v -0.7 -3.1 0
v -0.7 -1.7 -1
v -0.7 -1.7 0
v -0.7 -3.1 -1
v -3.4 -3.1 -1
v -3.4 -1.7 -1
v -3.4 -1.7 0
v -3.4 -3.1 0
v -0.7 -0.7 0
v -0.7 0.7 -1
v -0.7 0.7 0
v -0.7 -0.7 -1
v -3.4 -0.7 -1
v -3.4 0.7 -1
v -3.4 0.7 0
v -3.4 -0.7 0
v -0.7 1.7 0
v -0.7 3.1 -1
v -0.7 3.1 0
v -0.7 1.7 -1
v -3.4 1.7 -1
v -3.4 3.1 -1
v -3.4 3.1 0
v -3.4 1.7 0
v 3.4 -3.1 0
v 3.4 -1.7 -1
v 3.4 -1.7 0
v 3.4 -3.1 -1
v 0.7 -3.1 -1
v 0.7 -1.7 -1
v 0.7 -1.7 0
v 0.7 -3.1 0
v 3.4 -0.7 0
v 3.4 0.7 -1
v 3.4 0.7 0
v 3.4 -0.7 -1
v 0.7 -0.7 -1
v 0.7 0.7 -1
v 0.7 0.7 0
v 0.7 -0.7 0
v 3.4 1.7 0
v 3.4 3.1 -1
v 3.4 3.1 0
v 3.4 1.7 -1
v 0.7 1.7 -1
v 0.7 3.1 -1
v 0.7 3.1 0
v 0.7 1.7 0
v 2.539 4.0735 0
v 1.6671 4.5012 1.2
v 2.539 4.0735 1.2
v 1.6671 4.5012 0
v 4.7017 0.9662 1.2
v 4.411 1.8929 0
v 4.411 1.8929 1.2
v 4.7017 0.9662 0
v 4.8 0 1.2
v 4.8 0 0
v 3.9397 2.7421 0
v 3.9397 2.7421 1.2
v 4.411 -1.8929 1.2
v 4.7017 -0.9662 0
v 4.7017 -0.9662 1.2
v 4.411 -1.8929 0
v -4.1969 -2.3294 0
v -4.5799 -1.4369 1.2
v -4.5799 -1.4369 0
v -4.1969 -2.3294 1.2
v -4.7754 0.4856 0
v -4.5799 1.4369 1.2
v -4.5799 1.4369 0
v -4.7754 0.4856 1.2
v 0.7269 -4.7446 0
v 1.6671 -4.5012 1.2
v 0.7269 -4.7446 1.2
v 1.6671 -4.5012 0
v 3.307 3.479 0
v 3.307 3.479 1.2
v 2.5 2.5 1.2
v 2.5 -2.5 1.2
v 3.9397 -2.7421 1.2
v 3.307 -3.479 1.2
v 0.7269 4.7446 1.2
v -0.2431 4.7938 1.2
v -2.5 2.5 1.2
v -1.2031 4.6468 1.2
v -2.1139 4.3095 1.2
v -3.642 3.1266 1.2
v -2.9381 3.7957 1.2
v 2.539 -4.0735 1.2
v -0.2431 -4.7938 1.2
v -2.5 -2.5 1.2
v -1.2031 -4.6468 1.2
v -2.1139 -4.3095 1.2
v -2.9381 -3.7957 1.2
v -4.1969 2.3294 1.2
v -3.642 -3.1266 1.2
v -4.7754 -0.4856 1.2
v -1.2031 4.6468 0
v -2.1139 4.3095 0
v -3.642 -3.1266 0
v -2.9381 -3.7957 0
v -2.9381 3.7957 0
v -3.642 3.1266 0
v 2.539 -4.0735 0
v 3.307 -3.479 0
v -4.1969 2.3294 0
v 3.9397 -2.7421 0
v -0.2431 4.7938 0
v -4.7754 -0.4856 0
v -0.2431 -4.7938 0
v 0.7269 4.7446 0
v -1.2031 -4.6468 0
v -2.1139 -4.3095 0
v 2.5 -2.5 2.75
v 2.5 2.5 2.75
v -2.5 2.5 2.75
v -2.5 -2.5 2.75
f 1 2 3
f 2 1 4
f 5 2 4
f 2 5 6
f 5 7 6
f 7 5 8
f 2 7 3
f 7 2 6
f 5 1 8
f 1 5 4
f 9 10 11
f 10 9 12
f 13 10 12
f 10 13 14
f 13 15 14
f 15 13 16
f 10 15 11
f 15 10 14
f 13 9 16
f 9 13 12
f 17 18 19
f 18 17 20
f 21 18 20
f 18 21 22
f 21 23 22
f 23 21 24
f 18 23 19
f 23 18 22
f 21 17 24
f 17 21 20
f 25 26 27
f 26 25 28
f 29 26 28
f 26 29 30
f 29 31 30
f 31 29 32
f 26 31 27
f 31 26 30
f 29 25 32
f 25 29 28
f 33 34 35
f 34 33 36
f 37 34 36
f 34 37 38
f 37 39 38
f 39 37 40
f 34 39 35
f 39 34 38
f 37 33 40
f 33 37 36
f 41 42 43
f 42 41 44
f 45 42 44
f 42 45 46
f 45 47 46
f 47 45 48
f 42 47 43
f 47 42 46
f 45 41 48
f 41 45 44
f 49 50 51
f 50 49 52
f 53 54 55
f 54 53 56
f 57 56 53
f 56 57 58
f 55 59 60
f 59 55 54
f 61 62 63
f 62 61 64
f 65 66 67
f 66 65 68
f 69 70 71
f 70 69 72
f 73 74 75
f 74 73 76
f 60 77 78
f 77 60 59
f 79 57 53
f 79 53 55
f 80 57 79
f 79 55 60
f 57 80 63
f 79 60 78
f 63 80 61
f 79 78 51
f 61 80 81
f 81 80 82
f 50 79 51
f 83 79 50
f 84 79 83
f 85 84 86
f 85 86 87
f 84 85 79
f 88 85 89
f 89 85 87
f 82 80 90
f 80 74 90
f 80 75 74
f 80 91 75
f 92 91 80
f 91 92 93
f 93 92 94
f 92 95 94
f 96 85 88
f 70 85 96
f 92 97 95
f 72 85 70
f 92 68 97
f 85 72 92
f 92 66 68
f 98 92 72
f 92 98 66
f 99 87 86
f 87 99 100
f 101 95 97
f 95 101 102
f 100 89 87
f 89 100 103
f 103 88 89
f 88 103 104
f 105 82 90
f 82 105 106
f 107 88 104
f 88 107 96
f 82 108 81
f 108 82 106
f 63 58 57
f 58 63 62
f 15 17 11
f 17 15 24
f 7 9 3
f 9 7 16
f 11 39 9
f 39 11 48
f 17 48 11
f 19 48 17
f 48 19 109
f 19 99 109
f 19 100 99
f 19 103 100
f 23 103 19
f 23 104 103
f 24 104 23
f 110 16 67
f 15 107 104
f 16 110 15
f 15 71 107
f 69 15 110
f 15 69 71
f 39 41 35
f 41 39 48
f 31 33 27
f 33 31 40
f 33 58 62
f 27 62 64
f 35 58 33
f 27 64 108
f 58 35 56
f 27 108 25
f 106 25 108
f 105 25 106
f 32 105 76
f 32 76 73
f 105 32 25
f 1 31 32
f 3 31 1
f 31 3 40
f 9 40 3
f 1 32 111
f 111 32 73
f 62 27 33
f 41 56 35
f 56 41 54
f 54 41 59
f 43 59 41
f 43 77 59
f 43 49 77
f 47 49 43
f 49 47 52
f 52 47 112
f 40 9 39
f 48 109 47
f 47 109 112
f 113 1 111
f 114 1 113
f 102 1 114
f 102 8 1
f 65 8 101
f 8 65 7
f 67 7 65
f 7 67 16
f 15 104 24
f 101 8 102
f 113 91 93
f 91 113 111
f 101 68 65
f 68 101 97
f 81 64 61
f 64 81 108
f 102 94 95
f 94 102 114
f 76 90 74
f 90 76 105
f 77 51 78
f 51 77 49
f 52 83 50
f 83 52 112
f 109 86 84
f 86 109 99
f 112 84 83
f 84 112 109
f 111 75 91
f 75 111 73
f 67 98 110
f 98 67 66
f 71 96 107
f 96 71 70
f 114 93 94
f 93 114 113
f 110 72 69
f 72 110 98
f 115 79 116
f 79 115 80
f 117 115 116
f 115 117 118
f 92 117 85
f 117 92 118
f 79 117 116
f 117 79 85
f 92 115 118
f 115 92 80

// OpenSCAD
// file: ../lib/2d_shapes.scad
// 2d_shapes.scad -- contains auxiliary functions needed to work with 2D objects */
// Copyright (C) 2023  Maxim Kukushkin <maxim.kukushkin@gmail.com>

/*
This file is part of YetAnotherBurner.

YetAnotherBurner is free software: you can redistribute it and/or modify it under the terms of the GNU General Public License as published by the Free Software Foundation, either version 3 of the License, or (at your option) any later version.

YetAnotherBurner is distributed in the hope that it will be useful, but WITHOUT ANY WARRANTY; without even the implied warranty of MERCHANTABILITY or FITNESS FOR A PARTICULAR PURPOSE. See the GNU General Public License for more details.

You should have received a copy of the GNU General Public License along with YetAnotherBurner. If not, see <https://www.gnu.org/licenses/>. 
*/

use <bezier.scad>

eps = 0.004;

function circv(r = 1, fn = 32, from = 0, to = 360) =
    let(loop_limit = (to - from == 360) ? fn - 1 : fn)
    [ for(i = [0 : loop_limit])
        let(angle = from + (to - from) * i / fn)
            [r * cos(angle), r * sin(angle)] ];

function squarev(coords, rotation = 0) =
    let(
        dist = sqrt(pow(coords.x / 2, 2) + pow(coords.y / 2, 2)),
        angle = asin(coords.y / 2 / dist))
    [
        [dist * cos(angle + rotation), dist * sin(angle + rotation)],
        [dist * cos(180 - angle + rotation), dist * sin(180 - angle + rotation)],
        [dist * cos(180 + angle + rotation), dist * sin(180 + angle + rotation)],
        [dist * cos(-angle + rotation), dist * sin(-angle + rotation)],
    ];

// supports negative sizes
module uncentered_rounded_square(coords, rounding, centerX = false, centerY = false) {
    absX = abs(coords[0]);
    absY = abs(coords[1]); 
    assert(absX > 2 * rounding, "X size doesn't exceed the rounding");
    assert(absY > 2 * rounding, "Y size doesn't exceed the rounding");
    translate([
        centerX ? 0 : (coords.x > 0 ? absX/2 : -absX/2),
        centerY ? 0 : (coords.y > 0 ? absY/2 : -absY/2)
    ]) {        
        square([absX - 2 * rounding, absY], center=true);
        square([absX, absY - 2 * rounding], center=true);
        for (i = [-1, 1], j = [-1, 1])
            translate([i * (absX / 2 - rounding), j * (absY / 2 - rounding)])
                circle(r = rounding);
    }       
}               
                
// supports negative sizes
module centered_rounded_square(coords, rounding, centerX = true, centerY = true) {
    uncentered_rounded_square(coords, rounding, centerX, centerY);
}

// supports negative sizes
module centered_square(coords, centerX = true, centerY = true) {
    translate([
        centerX ? (-abs(coords.x) / 2) : (coords.x > 0 ? 0 : coords.x),
        centerY ? (-abs(coords.y) / 2) : (coords.y > 0 ? 0 : coords.y)
    ])
        square([abs(coords.x), abs(coords.y)]);
}

// supports negative sizes
module uncentered_square(coords, centerX = false, centerY = false) {
    centered_square(coords, centerX, centerY);
}

module smooth_right_angle_2d(x_width, y_width, dot_number = 20, eps = eps) {
    dots = [
        [-eps, -eps],
        for(i = [0 : dot_number])
            PointAlongBez4(
                [x_width , -eps],
                [x_width / 2, -eps],
                [-eps, y_width / 2],
                [-eps, y_width ],
                i / dot_number)
    ];

    polygon(dots);
}

module angle_rounding_2d(r, angle = 90, eps = eps, fromX = true) {
    if (angle == 90)
        difference() {
            translate([-eps, -eps])
                square([r + eps, r + eps]);
            translate([r, r])
                circle(r + eps);
        }
    else {
        dots = [
            [-eps, -eps],
            [r, -eps],
            [-eps + (r + eps) * cos(angle), -eps + (r + eps) * sin(angle)]
        ];
        rotate([0, 0, fromX ? 0 : -angle + 90])
        difference() {
            polygon(dots);
            rotate([0, 0, angle / 2])
                translate([(r + eps) / cos(angle / 2), 0, 0])
                    circle((r + eps) * tan(angle / 2), $fn=100);
        }
    }
}

// this module provides a cutting shape to make a circular cut given the length and
// depth of the cut
module circular_cut(l, depth, eps = eps) {
    if (depth < l / 2) {
        b = l / 2; // 'b' is half of the chord
        // alpha is the angle between radius and the chord going between the top point and one of
        // the points of the original chord
        alpha = atan(b / depth);
        // beta ios the angle between radiuses going to the above chord
        beta = 180 - 2 * alpha;
        c = b / tan(beta); // 'c' is the distance between the original chord and the center of the circle

        intersection() {
            translate([0, -eps])
                centered_square([l, depth + eps], centerY = false);
            translate([0, -c])
                circle(r = c + depth);
        }
    } else {
        translate([0, -eps])
            centered_square([l , depth - l / 2 + eps], centerY = false);
        translate([0, depth - l / 2])
            intersection() {
                circle(d = l);
                translate([0, -eps])
                    centered_square([l, l / 2 + eps], centerY = false);
            }
    }
}
// file: ../lib/3d_shapes.scad
// 3d_shapes.scad -- contains auxiliary functions needed to work with 3D objects */
// Copyright (C) 2023  Maxim Kukushkin <maxim.kukushkin@gmail.com>

/*
This file is part of YetAnotherBurner.

YetAnotherBurner is free software: you can redistribute it and/or modify it under the terms of the GNU General Public License as published by the Free Software Foundation, either version 3 of the License, or (at your option) any later version.

YetAnotherBurner is distributed in the hope that it will be useful, but WITHOUT ANY WARRANTY; without even the implied warranty of MERCHANTABILITY or FITNESS FOR A PARTICULAR PURPOSE. See the GNU General Public License for more details.

You should have received a copy of the GNU General Public License along with YetAnotherBurner. If not, see <https://www.gnu.org/licenses/>. 
*/

use <MCAD/boxes.scad>

use <2d_shapes.scad>

eps = 0.004;

// supports negative sizes
module uncentered_rounded_box(coords, rounding, centerX = false, centerY = false, centerZ = false, sidesonly = true) {
    translate([
        centerX ? 0 : (coords[0] / 2),
        centerY ? 0 : (coords[1] / 2),
        centerZ ? 0 : (coords[2] / 2)
    ])
        roundedBox([abs(coords.x), abs(coords.y), abs(coords.z)], rounding, sidesonly = sidesonly);
}

// supports negative sizes
module centered_rounded_box(coords, rounding, centerX = true, centerY = true, centerZ = true, sidesonly = true) {
    uncentered_rounded_box(coords, rounding, centerX, centerY, centerZ, sidesonly);
}

// supports negative sizes
module uncentered_box(coords, centerX = false, centerY = false, centerZ = false) {
    translate([
        centerX ? (-abs(coords.x) / 2) : (coords.x > 0 ? 0 : coords.x),
        centerY ? (-abs(coords.y) / 2) : (coords.y > 0 ? 0 : coords.y),
        centerZ ? (-abs(coords.z) / 2) : (coords.z > 0 ? 0 : coords.z)
    ])
        cube([abs(coords.x), abs(coords.y), abs(coords.z)]);
}

// supports negative sizes
module centered_box(coords, centerX = true, centerY = true, centerZ = true) {
    uncentered_box(coords, centerX, centerY, centerZ);
}

module angle_rounding(r, h, angle = 90, center = false, eps = eps, fromX = true) {
    linear_extrude(height = h, center = center)
        angle_rounding_2d(r, angle, eps, fromX);
}

module disc(outer_d = -1, h, center = true, outer_r = -1) {
    assert(outer_d != -1 || outer_r != -1, "Either d or r must be specified");
    assert(outer_d == -1 || outer_r == -1, "Both d and r cannot be specified together");

    d = outer_d == -1 ? outer_r * 2 : outer_d;
    cylinder(d = d - h, h = h, center = center);

    translate([0, 0, center ? 0 : h / 2])
        rotate_extrude()
            translate([d / 2 - h / 2, 0])
                circle(d = h, $fn = h * 4);
}
// main file
// ws2812b.scad -- contains a simplified model and sizes of ws2812b RGB LED */
// Copyright (C) 2023  Maxim Kukushkin <maxim.kukushkin@gmail.com>

/*
This file is part of YetAnotherBurner.

YetAnotherBurner is free software: you can redistribute it and/or modify it under the terms of the GNU General Public License as published by the Free Software Foundation, either version 3 of the License, or (at your option) any later version.

YetAnotherBurner is distributed in the hope that it will be useful, but WITHOUT ANY WARRANTY; without even the implied warranty of MERCHANTABILITY or FITNESS FOR A PARTICULAR PURPOSE. See the GNU General Public License for more details.

You should have received a copy of the GNU General Public License along with YetAnotherBurner. If not, see <https://www.gnu.org/licenses/>. 
*/

$fs = 1;
$fa = 0.4;

eps = 0.004;

use <../lib/3d_shapes.scad>

function ws2812b_pcb_d() = 9.6;
function ws2812b_pcb_h() = 1.2;
function ws2812b_pcb_flat_w() = 0.8;
function ws2812b_led_side() = 5;
function ws2812b_led_h() = 1.55;
function ws2812b_components_h() = 0.5;
function ws2812b_contact_offset_l() = 1.4;
function ws2812b_contact_offset_w() = 1.7;
function ws2812b_contact_l() = 2.7;
function ws2812b_contact_w() = 1.4;

contact_w_dist = (ws2812b_pcb_d() - 2 * ws2812b_contact_offset_w() - 3 * ws2812b_contact_w()) / 2;
contact_l_dist = ws2812b_pcb_d() - 2 * ws2812b_contact_offset_l() - 2 * ws2812b_contact_l();

ws2812b();

module ws2812b(from_base = true) {
    z_offset = from_base ? 0 : -(ws2812b_pcb_h() + ws2812b_led_h());
    translate([0, 0, z_offset]) {
        // pcb
        color("#333333")
            cylinder(d = ws2812b_pcb_d(), h = ws2812b_pcb_h());

        // led
        color("#DDDDDD")
            translate([0, 0, ws2812b_pcb_h() - eps])
                centered_box([ws2812b_led_side(), ws2812b_led_side(), ws2812b_led_h() + eps], centerZ=false);

        // contacts with tin
        color("silver")
            for(i = [-1, 1])
                for(j = [-1, 0, 1])
                    translate([
                        i * (contact_l_dist / 2 + ws2812b_contact_l() / 2),
                        j * (contact_w_dist + ws2812b_contact_w()),
                        eps
                    ])
                        centered_box([ws2812b_contact_l(), ws2812b_contact_w(), -1 - eps], centerZ = false);
    }
}
